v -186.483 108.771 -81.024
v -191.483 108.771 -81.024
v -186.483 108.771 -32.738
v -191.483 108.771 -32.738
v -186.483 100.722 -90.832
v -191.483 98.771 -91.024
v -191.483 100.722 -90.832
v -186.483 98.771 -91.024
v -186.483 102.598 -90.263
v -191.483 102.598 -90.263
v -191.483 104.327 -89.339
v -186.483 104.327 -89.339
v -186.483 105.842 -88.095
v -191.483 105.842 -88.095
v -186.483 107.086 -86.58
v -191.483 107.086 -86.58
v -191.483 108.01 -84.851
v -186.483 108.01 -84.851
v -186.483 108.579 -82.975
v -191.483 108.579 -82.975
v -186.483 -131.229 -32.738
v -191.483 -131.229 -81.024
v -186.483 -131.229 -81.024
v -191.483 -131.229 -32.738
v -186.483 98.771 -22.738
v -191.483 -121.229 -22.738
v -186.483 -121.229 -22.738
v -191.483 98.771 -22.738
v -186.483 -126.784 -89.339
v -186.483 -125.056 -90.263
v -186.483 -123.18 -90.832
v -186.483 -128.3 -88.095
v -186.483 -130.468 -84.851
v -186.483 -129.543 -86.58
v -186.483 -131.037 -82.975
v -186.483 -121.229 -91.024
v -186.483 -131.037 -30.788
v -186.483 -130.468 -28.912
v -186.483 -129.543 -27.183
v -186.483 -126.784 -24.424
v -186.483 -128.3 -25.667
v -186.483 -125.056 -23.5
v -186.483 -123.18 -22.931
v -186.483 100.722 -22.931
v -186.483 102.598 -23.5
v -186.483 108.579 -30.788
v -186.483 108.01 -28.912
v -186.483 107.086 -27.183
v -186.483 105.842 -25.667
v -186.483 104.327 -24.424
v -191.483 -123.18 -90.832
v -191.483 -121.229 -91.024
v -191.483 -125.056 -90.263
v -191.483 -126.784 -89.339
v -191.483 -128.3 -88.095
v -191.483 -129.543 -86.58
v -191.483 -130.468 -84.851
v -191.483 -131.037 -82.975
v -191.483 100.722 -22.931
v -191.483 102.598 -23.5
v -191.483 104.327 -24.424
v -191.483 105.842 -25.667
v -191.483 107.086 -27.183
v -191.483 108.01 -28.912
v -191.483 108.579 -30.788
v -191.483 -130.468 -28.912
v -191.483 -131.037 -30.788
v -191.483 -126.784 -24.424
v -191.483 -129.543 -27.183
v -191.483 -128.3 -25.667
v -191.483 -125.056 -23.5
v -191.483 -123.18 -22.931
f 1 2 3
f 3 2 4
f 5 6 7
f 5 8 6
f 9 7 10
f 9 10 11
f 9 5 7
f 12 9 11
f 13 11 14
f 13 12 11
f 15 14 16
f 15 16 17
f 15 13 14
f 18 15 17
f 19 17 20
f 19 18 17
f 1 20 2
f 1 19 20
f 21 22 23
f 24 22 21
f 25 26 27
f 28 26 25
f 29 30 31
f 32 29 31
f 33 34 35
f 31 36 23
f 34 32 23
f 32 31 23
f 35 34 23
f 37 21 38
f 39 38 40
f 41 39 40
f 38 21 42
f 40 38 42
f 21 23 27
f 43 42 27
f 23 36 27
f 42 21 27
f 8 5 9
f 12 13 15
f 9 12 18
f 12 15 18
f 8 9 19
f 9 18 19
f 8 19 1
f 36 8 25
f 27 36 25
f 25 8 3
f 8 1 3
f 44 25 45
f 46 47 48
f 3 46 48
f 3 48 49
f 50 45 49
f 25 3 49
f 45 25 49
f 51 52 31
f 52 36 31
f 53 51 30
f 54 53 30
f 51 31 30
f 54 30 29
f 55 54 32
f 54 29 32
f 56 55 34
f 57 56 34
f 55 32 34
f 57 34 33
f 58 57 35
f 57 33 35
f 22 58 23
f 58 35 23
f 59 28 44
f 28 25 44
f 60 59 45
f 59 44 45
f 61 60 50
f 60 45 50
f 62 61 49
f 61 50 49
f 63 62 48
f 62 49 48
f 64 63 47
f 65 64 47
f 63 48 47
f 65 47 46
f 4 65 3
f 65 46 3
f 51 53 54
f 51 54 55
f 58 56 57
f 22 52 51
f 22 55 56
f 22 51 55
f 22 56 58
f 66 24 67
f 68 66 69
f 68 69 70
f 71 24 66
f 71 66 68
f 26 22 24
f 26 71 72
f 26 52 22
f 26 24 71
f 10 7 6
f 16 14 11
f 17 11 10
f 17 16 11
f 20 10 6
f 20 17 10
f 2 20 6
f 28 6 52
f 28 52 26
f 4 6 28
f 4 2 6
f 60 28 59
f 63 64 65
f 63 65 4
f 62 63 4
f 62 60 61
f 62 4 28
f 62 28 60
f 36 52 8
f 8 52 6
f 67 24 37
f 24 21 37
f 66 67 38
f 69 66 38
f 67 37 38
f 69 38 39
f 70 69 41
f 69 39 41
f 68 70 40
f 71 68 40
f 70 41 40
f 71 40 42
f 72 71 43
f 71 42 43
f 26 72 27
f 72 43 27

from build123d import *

# Parameters (mm, degrees)
SKETCH1_W           = 68.285556752
SKETCH1_H           = 240
BOSS_EXTRUDE1_DEPTH = 5
FILLET1_R           = 10


with BuildPart() as part:
    # Sketch1 → Boss-Extrude1 (new body)
    with BuildSketch(Plane.ZY.offset(191.482668327)):
        with Locations((-56.88127805, -11.228757924)):
            Rectangle(SKETCH1_W, SKETCH1_H)
    extrude(amount=-BOSS_EXTRUDE1_DEPTH)

    # Fillet1
    fillet1_edges = [part.edges().sort_by_distance(p)[0] for p in [
        (-188.982668327, 108.771242076, -91.024056426),
        (-188.982668327, 108.771242076, -22.738499674),
        (-188.982668327, -131.228757924, -22.738499674),
        (-188.982668327, -131.228757924, -91.024056426),
    ]]
    fillet(fillet1_edges, radius=FILLET1_R)


solid = part.part
